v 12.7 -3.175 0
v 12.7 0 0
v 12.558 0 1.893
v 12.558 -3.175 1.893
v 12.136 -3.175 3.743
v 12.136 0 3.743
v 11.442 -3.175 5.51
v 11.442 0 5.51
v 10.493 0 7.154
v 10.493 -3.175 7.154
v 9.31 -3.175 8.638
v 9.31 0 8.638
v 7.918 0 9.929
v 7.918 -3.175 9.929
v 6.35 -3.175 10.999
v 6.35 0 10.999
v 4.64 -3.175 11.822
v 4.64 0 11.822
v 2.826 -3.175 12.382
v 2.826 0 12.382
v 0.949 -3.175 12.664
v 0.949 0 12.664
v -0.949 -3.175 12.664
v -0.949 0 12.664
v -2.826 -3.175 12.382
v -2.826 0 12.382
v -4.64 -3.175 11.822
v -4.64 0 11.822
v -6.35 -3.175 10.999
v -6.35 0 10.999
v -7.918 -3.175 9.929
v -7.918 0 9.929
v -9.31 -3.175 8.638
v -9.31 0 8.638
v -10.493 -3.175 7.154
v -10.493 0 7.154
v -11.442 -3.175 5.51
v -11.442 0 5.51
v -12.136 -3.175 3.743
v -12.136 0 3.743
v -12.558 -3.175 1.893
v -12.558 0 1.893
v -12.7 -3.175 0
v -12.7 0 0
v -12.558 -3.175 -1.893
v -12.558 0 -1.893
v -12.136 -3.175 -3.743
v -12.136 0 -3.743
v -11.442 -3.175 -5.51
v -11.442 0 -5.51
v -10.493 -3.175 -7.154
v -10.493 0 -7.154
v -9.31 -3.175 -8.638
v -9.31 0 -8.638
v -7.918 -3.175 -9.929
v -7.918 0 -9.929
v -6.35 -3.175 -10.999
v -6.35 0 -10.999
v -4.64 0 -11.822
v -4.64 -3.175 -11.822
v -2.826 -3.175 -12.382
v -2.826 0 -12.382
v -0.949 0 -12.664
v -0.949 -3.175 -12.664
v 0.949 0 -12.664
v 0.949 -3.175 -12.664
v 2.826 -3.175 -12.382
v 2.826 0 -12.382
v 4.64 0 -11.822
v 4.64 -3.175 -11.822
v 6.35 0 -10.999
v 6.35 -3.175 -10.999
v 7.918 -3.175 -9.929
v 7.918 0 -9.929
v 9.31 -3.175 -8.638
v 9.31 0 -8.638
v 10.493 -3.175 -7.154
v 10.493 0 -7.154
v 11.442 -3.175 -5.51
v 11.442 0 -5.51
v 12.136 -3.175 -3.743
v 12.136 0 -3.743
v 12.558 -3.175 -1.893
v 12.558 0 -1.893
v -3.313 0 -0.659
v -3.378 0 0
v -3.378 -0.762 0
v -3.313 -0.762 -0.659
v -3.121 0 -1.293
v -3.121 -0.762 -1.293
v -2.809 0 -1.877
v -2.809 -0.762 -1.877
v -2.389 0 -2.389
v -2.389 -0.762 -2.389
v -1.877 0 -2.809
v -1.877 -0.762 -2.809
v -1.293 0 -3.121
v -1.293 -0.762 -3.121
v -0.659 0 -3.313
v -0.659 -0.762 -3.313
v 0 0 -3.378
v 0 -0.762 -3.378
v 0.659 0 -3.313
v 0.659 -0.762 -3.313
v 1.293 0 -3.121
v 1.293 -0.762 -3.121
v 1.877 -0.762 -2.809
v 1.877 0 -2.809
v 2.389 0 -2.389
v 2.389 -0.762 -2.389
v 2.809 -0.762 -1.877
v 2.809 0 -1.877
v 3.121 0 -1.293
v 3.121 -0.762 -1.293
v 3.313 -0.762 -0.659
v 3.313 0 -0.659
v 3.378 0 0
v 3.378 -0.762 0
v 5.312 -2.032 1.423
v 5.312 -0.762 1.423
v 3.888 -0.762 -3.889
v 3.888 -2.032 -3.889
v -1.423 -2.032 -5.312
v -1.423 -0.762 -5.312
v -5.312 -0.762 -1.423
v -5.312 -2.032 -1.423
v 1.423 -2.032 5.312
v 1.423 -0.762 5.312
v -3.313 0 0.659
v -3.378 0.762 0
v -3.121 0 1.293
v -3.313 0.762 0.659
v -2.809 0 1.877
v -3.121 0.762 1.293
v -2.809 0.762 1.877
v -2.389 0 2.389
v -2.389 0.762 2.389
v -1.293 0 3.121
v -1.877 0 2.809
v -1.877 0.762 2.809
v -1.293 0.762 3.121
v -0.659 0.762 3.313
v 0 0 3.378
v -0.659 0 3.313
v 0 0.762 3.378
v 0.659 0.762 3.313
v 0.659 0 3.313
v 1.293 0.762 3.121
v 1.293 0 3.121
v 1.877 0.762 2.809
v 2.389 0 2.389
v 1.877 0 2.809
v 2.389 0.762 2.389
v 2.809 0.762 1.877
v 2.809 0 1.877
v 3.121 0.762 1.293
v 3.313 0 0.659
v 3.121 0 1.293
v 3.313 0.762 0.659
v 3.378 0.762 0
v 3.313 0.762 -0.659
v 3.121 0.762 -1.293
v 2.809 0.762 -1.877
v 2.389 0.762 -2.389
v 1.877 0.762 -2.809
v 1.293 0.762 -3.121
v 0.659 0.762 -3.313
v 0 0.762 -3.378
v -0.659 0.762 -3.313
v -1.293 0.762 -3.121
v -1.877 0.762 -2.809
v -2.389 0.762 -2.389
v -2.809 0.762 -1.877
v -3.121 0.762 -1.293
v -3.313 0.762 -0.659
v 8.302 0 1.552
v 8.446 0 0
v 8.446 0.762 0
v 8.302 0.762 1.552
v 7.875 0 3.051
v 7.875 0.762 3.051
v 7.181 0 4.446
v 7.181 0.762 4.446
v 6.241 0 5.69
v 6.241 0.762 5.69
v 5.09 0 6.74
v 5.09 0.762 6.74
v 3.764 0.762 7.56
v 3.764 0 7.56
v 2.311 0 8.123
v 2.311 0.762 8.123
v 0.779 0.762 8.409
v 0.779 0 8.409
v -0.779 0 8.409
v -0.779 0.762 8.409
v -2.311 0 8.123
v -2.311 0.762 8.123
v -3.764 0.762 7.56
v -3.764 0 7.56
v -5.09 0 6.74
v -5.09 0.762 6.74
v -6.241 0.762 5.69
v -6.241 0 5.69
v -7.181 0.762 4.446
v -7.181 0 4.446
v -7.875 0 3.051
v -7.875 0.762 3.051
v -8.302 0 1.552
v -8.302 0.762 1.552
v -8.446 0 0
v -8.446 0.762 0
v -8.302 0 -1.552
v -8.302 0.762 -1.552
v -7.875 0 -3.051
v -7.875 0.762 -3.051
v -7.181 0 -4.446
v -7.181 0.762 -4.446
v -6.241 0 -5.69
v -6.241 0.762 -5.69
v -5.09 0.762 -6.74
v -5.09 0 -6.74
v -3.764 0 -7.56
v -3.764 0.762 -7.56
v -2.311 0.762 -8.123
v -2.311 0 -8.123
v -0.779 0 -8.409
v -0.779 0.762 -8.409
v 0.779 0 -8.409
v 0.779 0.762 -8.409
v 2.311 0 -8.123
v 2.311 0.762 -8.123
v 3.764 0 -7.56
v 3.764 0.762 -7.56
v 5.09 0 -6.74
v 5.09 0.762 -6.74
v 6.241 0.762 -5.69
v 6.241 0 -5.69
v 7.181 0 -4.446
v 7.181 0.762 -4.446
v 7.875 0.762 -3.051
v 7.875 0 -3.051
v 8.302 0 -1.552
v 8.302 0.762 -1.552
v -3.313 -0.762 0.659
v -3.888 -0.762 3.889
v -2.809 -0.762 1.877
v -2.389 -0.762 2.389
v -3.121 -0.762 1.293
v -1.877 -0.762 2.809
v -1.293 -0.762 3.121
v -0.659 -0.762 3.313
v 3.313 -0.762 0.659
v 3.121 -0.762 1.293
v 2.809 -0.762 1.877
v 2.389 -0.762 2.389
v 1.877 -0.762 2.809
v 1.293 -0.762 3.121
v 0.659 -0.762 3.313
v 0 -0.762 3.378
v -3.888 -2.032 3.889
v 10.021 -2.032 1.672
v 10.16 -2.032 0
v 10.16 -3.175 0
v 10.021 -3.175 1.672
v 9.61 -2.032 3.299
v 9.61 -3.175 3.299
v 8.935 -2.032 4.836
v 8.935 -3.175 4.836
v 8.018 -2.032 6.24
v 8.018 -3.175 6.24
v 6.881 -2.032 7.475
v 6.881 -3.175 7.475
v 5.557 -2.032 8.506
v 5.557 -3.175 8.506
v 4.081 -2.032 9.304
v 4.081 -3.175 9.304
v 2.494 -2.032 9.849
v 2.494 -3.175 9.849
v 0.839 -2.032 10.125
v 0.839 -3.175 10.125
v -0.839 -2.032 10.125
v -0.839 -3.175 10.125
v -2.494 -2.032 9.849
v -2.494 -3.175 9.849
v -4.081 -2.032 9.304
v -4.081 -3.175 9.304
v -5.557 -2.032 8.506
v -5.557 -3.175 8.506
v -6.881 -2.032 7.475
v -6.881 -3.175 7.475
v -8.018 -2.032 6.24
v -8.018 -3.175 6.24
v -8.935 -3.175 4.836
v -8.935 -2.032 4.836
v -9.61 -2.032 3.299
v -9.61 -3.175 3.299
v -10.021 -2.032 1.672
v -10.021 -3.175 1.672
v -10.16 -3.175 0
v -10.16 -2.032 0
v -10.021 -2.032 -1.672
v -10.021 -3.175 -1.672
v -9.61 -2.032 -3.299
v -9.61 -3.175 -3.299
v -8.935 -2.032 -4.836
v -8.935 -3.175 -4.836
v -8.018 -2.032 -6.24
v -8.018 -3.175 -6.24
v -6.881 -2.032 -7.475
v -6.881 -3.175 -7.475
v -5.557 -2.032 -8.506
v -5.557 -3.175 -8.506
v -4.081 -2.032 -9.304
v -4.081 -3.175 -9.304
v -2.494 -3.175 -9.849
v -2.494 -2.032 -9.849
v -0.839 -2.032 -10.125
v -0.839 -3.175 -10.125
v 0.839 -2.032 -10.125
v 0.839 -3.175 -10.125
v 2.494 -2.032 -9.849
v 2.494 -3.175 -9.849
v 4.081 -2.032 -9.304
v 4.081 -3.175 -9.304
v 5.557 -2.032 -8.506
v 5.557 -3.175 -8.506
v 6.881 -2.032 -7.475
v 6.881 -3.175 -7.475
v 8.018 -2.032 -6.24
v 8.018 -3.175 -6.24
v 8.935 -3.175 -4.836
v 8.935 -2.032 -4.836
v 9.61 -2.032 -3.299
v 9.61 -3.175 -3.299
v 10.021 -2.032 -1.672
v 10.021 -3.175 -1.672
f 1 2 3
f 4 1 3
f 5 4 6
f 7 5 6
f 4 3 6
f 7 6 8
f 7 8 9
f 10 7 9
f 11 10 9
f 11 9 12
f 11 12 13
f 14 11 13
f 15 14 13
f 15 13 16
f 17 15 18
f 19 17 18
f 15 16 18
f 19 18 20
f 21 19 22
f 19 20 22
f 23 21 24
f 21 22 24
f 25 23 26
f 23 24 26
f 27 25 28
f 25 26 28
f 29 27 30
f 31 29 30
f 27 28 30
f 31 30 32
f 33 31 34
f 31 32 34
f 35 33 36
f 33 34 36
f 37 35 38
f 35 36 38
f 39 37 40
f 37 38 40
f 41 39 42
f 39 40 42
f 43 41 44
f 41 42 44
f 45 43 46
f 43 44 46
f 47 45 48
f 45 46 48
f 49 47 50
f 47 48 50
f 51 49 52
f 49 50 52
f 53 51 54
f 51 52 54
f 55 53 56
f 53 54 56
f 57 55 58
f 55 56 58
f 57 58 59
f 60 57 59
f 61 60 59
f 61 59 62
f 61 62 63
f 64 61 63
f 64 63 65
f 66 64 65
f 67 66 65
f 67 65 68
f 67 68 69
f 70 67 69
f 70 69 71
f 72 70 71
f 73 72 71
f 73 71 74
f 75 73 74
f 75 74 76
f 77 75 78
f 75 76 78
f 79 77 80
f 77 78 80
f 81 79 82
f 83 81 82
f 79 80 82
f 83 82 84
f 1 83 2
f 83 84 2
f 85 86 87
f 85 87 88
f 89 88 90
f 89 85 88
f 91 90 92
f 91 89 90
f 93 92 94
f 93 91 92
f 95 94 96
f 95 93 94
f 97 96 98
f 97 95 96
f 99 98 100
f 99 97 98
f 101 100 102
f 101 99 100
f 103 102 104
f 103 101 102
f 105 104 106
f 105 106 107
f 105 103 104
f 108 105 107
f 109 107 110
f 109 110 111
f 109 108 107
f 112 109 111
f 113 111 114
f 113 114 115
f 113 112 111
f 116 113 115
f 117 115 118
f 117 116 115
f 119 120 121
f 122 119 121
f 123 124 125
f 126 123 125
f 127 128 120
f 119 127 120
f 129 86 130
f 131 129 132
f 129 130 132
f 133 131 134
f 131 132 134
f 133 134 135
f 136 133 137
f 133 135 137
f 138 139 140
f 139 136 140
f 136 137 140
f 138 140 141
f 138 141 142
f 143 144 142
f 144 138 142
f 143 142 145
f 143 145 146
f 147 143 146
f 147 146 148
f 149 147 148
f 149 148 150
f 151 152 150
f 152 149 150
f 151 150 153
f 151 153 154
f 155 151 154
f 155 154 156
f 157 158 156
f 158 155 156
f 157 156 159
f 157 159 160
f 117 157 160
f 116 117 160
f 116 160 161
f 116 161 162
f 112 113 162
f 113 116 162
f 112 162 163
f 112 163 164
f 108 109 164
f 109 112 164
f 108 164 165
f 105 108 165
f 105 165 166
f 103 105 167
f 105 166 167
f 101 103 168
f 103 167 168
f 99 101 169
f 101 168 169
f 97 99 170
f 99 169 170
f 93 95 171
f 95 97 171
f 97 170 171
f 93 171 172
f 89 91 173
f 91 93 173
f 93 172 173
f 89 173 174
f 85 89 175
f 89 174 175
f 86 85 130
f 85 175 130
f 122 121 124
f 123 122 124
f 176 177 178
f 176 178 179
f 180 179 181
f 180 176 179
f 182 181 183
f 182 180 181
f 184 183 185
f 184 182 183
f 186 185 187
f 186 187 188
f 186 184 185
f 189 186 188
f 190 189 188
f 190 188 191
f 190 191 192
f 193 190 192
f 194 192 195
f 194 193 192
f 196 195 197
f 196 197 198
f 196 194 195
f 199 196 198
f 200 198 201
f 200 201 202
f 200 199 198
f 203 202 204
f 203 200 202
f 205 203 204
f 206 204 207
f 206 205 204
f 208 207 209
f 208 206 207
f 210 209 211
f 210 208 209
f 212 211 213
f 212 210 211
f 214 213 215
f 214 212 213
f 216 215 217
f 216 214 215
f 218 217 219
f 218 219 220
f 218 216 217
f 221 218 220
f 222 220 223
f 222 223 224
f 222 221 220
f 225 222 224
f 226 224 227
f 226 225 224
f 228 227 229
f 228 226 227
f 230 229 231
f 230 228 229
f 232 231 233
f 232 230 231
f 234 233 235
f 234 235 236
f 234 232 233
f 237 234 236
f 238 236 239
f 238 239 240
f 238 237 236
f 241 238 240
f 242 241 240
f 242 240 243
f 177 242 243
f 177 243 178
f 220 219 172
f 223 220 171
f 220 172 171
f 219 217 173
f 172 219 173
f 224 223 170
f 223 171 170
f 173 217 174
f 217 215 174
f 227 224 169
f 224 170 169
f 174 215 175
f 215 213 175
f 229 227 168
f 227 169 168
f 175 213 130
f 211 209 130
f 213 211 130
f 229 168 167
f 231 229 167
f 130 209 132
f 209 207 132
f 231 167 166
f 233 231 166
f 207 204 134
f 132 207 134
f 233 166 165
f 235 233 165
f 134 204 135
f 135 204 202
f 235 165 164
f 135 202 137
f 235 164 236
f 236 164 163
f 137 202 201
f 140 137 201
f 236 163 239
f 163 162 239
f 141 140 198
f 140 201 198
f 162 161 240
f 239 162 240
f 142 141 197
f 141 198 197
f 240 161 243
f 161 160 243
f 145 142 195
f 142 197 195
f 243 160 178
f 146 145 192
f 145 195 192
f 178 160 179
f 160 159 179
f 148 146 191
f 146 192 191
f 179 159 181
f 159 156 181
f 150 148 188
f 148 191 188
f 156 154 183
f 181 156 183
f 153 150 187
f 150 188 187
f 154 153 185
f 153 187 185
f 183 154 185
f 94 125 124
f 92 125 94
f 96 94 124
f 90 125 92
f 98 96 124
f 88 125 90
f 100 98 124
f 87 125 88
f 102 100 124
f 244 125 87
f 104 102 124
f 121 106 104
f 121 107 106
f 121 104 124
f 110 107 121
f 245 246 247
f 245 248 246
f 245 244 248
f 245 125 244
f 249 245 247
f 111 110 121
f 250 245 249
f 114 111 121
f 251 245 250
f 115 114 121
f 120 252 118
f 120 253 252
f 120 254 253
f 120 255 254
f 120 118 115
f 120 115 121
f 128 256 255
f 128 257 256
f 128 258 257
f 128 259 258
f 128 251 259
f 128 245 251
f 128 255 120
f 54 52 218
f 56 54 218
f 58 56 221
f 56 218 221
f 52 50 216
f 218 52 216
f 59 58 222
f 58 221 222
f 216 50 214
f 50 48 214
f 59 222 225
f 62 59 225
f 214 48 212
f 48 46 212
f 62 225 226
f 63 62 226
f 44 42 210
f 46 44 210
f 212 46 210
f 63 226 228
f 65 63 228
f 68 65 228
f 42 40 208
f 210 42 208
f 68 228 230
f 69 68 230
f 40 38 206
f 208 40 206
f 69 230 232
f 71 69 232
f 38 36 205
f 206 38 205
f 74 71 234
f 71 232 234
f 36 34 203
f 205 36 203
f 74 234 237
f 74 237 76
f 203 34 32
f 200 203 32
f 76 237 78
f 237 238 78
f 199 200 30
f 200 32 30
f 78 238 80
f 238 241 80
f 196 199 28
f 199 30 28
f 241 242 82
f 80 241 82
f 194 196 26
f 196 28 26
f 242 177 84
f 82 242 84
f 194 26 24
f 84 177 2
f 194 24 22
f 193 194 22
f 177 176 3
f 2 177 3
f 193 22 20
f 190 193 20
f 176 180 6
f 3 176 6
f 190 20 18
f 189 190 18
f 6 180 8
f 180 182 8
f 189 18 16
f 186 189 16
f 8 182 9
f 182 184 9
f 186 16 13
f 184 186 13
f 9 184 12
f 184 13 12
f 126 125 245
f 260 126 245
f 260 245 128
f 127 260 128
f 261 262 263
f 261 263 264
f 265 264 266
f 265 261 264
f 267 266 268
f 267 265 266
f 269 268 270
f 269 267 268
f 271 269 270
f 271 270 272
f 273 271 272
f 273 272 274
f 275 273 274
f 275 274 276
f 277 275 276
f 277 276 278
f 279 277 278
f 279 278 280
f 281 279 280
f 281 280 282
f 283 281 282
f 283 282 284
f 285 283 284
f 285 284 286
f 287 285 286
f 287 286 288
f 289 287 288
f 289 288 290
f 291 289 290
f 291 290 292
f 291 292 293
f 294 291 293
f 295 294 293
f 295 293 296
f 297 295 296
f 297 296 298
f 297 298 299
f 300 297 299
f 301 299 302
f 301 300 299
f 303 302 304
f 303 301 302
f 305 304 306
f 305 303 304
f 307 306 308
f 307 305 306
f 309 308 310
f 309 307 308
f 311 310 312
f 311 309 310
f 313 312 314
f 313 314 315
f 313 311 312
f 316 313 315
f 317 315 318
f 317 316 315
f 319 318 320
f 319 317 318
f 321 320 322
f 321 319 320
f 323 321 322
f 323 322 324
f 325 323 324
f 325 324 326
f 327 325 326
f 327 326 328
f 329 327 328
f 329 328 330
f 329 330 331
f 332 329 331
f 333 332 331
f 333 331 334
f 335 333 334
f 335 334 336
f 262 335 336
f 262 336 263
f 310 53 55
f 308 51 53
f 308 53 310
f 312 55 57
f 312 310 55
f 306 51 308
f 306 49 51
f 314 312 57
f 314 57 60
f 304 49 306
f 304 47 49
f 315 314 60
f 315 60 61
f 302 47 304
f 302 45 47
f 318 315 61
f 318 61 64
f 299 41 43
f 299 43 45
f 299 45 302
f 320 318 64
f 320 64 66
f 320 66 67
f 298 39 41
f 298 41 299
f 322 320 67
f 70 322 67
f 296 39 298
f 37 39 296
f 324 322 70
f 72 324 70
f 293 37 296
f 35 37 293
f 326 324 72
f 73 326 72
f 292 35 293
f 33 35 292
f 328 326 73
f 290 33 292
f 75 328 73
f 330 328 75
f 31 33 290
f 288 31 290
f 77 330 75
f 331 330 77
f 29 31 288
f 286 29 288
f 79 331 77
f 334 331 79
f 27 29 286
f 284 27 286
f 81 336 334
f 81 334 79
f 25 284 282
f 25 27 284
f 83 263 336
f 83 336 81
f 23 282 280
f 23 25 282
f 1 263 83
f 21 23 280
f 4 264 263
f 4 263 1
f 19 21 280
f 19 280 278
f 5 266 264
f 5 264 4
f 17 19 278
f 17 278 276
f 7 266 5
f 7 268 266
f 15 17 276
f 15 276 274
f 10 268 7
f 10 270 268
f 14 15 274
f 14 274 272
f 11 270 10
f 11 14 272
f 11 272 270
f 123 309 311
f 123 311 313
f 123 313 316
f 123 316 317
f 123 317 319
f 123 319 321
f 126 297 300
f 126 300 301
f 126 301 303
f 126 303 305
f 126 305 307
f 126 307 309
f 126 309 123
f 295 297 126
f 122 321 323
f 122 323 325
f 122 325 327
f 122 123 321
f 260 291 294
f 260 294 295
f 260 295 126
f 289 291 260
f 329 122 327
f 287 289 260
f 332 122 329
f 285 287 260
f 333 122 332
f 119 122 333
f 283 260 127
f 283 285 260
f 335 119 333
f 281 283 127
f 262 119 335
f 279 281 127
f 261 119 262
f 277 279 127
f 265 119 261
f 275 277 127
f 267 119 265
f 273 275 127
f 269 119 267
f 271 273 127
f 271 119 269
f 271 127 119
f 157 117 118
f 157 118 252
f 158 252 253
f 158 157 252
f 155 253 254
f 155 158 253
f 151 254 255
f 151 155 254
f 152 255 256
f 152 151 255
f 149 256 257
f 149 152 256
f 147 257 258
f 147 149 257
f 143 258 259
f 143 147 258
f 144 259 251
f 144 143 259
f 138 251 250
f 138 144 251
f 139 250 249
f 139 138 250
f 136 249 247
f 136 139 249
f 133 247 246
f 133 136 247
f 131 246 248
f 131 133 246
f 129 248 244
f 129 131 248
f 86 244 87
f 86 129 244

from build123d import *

# Parameters (mm, degrees)
F0_R     = 12.7
F0_R_2   = 10.16
F1_DEPTH = 3.175
F2_DEPTH = 2.032
F0_R_3   = 3.3782
F3_DEPTH = 0.762
F4_R     = 8.4455
F5_DEPTH = 0.762
F7_D     = 6.7564


# Not quite as in the source:
# - the program builds the solid bodies; features that only make, move or delete a surface that nothing else refers to are left out


with BuildPart() as f1:
    # F0 (on Front) → F1 (new body)
    with BuildSketch(Plane.XZ):
        Circle(F0_R)
        Circle(F0_R_2, mode=Mode.SUBTRACT)
    extrude(amount=F1_DEPTH)

    # F0 (on Front) → F2 (join)
    with BuildSketch(Plane.XZ):
        Circle(F0_R_2)
        Polygon((1.4233928974, 5.3116902648), (5.3117551551, 1.4231507237), (3.8883622577, -3.8885395411), (-1.4233928974, -5.3116902648), (-5.3117551551, -1.4231507237), (-3.8883622577, 3.8885395411), align=None, mode=Mode.SUBTRACT)
    extrude(amount=F2_DEPTH)

    # F0 (on Front) → F3 (join)
    with BuildSketch(Plane.XZ):
        Polygon((3.8883622577, -3.8885395411), (5.3117551551, 1.4231507237), (1.4233928974, 5.3116902648), (-3.8883622577, 3.8885395411), (-5.3117551551, -1.4231507237), (-1.4233928974, -5.3116902648), align=None)
        Circle(F0_R_3, mode=Mode.SUBTRACT)
    extrude(amount=F3_DEPTH)

    # F4 (on face) → F5 (join)
    with BuildSketch(Plane.XZ):
        Circle(F4_R)
    extrude(amount=-F5_DEPTH)

    # F7 (through all)
    with Locations(Plane.XZ):
        with Locations((0, 0)):
            Hole(F7_D / 2)


solid = f1.part
